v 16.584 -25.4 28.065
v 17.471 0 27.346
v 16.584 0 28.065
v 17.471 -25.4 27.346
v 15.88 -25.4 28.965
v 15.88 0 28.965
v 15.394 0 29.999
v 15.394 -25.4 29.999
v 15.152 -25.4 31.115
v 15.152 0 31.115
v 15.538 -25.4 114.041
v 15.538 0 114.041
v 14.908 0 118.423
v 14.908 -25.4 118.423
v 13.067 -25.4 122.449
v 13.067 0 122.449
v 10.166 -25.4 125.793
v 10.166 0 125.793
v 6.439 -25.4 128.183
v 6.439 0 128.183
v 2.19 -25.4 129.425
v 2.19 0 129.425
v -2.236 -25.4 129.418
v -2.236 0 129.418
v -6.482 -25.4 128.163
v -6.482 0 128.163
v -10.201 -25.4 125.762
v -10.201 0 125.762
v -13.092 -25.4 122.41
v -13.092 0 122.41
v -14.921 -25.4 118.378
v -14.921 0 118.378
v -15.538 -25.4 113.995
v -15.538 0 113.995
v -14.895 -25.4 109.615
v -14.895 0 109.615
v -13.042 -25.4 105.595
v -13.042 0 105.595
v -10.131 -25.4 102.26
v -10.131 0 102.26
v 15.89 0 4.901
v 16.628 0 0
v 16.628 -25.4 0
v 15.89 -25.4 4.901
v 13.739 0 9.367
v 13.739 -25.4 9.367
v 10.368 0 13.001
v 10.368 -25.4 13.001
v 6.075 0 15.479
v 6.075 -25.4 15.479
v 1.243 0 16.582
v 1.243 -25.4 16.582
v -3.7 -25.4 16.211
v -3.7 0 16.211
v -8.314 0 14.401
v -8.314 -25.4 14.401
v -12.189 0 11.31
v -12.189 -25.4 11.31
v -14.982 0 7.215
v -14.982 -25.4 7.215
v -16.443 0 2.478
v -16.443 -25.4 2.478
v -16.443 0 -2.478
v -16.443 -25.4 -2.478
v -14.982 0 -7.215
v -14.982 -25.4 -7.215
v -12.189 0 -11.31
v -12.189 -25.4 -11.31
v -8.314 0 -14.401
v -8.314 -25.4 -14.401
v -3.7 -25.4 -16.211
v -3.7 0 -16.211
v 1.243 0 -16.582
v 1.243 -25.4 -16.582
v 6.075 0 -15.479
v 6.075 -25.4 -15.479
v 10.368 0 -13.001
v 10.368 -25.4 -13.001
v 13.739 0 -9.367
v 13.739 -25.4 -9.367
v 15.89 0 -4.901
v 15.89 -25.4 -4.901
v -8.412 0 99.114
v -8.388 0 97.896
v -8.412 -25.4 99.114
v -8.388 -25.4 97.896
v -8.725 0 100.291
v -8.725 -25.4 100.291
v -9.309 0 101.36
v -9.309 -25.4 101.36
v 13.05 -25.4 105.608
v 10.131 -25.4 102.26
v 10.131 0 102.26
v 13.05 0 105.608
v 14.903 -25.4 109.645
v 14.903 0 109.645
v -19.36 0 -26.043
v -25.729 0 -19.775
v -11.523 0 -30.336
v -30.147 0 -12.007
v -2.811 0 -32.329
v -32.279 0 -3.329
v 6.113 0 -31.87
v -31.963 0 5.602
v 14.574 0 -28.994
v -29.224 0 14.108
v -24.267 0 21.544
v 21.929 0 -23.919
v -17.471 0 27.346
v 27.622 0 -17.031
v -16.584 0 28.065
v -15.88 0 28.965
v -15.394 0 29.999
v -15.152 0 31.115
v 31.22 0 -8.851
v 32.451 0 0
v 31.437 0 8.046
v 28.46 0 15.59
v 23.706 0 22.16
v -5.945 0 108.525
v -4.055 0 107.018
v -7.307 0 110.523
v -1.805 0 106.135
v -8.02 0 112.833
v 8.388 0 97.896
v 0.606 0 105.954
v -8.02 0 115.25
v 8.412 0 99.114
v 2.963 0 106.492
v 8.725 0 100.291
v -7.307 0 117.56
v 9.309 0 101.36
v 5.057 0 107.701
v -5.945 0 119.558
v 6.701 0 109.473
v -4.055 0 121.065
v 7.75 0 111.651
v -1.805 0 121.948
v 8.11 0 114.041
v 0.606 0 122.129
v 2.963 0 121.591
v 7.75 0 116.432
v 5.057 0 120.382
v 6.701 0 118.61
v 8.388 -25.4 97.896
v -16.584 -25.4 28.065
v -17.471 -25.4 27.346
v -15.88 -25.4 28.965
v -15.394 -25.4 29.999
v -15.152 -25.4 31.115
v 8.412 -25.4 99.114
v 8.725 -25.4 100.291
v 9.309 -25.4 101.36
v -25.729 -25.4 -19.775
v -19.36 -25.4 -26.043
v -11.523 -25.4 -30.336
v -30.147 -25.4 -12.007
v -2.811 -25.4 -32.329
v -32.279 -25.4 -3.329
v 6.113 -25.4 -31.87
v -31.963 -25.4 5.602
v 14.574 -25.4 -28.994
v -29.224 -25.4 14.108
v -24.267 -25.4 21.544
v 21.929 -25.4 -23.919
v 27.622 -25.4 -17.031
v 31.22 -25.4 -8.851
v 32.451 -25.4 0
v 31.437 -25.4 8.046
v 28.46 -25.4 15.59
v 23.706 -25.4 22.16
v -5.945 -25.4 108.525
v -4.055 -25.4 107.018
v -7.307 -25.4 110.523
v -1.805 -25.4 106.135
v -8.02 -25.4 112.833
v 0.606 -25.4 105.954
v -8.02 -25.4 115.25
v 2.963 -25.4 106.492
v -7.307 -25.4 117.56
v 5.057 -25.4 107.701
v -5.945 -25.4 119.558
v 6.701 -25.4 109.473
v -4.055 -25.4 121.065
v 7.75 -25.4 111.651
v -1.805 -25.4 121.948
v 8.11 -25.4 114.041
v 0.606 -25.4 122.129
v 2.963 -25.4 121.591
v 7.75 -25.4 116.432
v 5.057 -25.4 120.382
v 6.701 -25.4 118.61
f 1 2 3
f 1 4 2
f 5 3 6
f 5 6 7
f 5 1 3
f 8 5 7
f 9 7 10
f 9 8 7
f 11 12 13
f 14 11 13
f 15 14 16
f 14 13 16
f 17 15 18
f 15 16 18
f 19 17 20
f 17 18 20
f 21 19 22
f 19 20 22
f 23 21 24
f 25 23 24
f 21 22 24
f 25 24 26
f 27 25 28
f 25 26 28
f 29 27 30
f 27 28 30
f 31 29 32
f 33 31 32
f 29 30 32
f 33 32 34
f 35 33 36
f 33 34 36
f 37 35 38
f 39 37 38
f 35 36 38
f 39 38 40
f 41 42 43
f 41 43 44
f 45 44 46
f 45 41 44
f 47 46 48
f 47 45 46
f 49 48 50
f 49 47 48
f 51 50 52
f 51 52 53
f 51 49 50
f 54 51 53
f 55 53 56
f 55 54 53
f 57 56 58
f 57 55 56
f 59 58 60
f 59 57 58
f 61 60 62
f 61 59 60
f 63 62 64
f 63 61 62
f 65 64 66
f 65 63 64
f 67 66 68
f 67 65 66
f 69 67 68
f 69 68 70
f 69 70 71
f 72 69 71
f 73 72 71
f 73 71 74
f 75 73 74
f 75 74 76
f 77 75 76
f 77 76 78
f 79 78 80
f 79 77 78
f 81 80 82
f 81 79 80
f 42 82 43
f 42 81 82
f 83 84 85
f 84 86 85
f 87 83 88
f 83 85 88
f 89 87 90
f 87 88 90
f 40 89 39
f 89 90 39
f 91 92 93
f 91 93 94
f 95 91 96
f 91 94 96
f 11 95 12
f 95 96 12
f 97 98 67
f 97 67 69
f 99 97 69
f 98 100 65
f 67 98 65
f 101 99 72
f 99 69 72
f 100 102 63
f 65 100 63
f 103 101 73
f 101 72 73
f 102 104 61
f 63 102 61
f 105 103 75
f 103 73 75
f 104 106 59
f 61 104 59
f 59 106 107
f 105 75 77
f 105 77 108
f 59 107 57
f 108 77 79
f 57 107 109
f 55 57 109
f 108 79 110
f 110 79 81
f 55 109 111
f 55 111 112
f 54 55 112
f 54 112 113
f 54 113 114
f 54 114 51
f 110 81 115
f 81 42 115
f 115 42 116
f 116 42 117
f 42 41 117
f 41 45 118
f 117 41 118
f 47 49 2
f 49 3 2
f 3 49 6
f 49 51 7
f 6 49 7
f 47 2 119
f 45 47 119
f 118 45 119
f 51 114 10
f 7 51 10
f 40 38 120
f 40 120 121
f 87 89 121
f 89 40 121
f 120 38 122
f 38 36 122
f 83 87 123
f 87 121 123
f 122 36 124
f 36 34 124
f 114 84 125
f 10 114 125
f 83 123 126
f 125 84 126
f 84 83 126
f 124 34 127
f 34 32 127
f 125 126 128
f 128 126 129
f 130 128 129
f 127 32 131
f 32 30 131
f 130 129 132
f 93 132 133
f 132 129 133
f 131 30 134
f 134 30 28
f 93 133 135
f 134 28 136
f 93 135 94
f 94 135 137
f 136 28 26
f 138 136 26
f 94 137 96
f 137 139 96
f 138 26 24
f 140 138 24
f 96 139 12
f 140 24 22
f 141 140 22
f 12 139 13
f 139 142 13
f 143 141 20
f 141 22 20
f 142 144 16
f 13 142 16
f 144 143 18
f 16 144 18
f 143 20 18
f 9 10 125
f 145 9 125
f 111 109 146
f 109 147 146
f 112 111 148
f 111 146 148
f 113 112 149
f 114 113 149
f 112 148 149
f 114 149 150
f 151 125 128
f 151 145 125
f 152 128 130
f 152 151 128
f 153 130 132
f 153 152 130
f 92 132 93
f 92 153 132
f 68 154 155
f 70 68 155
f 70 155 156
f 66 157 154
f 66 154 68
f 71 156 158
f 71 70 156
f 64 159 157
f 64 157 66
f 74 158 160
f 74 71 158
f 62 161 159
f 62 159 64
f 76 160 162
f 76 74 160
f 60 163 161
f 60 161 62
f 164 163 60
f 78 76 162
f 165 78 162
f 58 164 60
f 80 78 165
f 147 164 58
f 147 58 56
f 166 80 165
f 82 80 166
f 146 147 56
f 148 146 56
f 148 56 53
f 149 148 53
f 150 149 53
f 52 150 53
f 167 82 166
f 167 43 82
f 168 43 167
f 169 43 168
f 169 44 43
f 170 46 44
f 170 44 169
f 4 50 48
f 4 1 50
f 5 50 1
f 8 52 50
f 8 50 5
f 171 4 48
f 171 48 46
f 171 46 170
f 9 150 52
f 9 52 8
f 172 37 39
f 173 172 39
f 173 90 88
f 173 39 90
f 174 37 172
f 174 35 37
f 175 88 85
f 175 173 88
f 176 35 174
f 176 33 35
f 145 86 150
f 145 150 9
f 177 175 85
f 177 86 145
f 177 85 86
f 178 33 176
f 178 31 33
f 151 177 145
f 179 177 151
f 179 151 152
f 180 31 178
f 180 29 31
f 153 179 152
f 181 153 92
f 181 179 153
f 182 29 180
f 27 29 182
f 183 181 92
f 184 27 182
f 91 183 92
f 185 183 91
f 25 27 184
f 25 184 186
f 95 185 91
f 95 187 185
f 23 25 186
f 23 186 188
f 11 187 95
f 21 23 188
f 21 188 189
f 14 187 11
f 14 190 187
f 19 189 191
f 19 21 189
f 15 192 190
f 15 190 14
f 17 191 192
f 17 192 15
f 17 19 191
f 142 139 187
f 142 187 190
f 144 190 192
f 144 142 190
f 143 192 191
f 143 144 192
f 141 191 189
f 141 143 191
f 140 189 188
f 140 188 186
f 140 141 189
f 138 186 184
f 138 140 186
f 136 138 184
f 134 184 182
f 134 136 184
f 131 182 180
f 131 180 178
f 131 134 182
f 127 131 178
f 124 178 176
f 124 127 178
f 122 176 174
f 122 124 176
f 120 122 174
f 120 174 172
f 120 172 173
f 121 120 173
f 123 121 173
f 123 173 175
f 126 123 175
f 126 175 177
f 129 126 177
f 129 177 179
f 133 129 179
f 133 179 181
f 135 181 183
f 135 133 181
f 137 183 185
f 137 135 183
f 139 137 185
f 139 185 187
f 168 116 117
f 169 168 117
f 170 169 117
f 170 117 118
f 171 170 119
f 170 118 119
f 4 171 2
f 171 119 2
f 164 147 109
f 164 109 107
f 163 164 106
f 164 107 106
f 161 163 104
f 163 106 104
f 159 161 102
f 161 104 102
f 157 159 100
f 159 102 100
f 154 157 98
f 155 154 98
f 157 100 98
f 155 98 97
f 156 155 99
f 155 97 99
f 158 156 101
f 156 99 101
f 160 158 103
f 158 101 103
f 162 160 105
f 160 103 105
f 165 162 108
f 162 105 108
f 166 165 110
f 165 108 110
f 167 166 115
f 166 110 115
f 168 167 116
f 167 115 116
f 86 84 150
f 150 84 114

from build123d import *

# Parameters (mm, degrees)
F0_R     = 16.628387
F0_R_2   = 8.110112
F1_DEPTH = 25.4
F2_R     = 5.08


with BuildPart() as f1:
    # F0 (on Front) → F1 (new body)
    with BuildSketch(Plane.XZ):
        with BuildLine():
            ThreePointArc((-15.411044, 28.557638), (-16.627416, -27.866969), (32.450562, 0))
            ThreePointArc((32.450562, 0), (27.866969, 16.627416), (15.411044, 28.557638))
            ThreePointArc((15.411044, 28.557638), (0, 32.450562), (-15.411044, 28.557638))
        make_face()
        Circle(F0_R, mode=Mode.SUBTRACT)
        with BuildLine():
            ThreePointArc((-15.411044, 28.557638), (0, 32.450562), (15.411044, 28.557638))
            Line((15.411044, 28.557638), (8.096426, 100.779159))
            ThreePointArc((8.096426, 100.779159), (0, 98.503095), (-8.096426, 100.779159))
            Line((-8.096426, 100.779159), (-15.411044, 28.557638))
        make_face()
        with BuildLine():
            ThreePointArc((-8.096426, 100.779159), (0, 98.503095), (8.096426, 100.779159))
            ThreePointArc((8.096426, 100.779159), (13.550753, 106.437659), (15.53836, 114.041455))
            ThreePointArc((15.53836, 114.041455), (-7.603796, 127.592208), (-8.096426, 100.779159))
        make_face()
        with Locations((0, 114.041455)):
            Circle(F0_R_2, mode=Mode.SUBTRACT)
    extrude(amount=F1_DEPTH)

    # F2
    f2_edges = [f1.edges().sort_by_distance(p)[0] for p in [
        (15.411044, -12.7, 28.557638),
        (-15.411044, -12.7, 28.557638),
        (-8.096426, -12.7, 100.779159),
        (8.096426, -12.7, 100.779159),
    ]]
    fillet(f2_edges, radius=F2_R)


solid = f1.part
